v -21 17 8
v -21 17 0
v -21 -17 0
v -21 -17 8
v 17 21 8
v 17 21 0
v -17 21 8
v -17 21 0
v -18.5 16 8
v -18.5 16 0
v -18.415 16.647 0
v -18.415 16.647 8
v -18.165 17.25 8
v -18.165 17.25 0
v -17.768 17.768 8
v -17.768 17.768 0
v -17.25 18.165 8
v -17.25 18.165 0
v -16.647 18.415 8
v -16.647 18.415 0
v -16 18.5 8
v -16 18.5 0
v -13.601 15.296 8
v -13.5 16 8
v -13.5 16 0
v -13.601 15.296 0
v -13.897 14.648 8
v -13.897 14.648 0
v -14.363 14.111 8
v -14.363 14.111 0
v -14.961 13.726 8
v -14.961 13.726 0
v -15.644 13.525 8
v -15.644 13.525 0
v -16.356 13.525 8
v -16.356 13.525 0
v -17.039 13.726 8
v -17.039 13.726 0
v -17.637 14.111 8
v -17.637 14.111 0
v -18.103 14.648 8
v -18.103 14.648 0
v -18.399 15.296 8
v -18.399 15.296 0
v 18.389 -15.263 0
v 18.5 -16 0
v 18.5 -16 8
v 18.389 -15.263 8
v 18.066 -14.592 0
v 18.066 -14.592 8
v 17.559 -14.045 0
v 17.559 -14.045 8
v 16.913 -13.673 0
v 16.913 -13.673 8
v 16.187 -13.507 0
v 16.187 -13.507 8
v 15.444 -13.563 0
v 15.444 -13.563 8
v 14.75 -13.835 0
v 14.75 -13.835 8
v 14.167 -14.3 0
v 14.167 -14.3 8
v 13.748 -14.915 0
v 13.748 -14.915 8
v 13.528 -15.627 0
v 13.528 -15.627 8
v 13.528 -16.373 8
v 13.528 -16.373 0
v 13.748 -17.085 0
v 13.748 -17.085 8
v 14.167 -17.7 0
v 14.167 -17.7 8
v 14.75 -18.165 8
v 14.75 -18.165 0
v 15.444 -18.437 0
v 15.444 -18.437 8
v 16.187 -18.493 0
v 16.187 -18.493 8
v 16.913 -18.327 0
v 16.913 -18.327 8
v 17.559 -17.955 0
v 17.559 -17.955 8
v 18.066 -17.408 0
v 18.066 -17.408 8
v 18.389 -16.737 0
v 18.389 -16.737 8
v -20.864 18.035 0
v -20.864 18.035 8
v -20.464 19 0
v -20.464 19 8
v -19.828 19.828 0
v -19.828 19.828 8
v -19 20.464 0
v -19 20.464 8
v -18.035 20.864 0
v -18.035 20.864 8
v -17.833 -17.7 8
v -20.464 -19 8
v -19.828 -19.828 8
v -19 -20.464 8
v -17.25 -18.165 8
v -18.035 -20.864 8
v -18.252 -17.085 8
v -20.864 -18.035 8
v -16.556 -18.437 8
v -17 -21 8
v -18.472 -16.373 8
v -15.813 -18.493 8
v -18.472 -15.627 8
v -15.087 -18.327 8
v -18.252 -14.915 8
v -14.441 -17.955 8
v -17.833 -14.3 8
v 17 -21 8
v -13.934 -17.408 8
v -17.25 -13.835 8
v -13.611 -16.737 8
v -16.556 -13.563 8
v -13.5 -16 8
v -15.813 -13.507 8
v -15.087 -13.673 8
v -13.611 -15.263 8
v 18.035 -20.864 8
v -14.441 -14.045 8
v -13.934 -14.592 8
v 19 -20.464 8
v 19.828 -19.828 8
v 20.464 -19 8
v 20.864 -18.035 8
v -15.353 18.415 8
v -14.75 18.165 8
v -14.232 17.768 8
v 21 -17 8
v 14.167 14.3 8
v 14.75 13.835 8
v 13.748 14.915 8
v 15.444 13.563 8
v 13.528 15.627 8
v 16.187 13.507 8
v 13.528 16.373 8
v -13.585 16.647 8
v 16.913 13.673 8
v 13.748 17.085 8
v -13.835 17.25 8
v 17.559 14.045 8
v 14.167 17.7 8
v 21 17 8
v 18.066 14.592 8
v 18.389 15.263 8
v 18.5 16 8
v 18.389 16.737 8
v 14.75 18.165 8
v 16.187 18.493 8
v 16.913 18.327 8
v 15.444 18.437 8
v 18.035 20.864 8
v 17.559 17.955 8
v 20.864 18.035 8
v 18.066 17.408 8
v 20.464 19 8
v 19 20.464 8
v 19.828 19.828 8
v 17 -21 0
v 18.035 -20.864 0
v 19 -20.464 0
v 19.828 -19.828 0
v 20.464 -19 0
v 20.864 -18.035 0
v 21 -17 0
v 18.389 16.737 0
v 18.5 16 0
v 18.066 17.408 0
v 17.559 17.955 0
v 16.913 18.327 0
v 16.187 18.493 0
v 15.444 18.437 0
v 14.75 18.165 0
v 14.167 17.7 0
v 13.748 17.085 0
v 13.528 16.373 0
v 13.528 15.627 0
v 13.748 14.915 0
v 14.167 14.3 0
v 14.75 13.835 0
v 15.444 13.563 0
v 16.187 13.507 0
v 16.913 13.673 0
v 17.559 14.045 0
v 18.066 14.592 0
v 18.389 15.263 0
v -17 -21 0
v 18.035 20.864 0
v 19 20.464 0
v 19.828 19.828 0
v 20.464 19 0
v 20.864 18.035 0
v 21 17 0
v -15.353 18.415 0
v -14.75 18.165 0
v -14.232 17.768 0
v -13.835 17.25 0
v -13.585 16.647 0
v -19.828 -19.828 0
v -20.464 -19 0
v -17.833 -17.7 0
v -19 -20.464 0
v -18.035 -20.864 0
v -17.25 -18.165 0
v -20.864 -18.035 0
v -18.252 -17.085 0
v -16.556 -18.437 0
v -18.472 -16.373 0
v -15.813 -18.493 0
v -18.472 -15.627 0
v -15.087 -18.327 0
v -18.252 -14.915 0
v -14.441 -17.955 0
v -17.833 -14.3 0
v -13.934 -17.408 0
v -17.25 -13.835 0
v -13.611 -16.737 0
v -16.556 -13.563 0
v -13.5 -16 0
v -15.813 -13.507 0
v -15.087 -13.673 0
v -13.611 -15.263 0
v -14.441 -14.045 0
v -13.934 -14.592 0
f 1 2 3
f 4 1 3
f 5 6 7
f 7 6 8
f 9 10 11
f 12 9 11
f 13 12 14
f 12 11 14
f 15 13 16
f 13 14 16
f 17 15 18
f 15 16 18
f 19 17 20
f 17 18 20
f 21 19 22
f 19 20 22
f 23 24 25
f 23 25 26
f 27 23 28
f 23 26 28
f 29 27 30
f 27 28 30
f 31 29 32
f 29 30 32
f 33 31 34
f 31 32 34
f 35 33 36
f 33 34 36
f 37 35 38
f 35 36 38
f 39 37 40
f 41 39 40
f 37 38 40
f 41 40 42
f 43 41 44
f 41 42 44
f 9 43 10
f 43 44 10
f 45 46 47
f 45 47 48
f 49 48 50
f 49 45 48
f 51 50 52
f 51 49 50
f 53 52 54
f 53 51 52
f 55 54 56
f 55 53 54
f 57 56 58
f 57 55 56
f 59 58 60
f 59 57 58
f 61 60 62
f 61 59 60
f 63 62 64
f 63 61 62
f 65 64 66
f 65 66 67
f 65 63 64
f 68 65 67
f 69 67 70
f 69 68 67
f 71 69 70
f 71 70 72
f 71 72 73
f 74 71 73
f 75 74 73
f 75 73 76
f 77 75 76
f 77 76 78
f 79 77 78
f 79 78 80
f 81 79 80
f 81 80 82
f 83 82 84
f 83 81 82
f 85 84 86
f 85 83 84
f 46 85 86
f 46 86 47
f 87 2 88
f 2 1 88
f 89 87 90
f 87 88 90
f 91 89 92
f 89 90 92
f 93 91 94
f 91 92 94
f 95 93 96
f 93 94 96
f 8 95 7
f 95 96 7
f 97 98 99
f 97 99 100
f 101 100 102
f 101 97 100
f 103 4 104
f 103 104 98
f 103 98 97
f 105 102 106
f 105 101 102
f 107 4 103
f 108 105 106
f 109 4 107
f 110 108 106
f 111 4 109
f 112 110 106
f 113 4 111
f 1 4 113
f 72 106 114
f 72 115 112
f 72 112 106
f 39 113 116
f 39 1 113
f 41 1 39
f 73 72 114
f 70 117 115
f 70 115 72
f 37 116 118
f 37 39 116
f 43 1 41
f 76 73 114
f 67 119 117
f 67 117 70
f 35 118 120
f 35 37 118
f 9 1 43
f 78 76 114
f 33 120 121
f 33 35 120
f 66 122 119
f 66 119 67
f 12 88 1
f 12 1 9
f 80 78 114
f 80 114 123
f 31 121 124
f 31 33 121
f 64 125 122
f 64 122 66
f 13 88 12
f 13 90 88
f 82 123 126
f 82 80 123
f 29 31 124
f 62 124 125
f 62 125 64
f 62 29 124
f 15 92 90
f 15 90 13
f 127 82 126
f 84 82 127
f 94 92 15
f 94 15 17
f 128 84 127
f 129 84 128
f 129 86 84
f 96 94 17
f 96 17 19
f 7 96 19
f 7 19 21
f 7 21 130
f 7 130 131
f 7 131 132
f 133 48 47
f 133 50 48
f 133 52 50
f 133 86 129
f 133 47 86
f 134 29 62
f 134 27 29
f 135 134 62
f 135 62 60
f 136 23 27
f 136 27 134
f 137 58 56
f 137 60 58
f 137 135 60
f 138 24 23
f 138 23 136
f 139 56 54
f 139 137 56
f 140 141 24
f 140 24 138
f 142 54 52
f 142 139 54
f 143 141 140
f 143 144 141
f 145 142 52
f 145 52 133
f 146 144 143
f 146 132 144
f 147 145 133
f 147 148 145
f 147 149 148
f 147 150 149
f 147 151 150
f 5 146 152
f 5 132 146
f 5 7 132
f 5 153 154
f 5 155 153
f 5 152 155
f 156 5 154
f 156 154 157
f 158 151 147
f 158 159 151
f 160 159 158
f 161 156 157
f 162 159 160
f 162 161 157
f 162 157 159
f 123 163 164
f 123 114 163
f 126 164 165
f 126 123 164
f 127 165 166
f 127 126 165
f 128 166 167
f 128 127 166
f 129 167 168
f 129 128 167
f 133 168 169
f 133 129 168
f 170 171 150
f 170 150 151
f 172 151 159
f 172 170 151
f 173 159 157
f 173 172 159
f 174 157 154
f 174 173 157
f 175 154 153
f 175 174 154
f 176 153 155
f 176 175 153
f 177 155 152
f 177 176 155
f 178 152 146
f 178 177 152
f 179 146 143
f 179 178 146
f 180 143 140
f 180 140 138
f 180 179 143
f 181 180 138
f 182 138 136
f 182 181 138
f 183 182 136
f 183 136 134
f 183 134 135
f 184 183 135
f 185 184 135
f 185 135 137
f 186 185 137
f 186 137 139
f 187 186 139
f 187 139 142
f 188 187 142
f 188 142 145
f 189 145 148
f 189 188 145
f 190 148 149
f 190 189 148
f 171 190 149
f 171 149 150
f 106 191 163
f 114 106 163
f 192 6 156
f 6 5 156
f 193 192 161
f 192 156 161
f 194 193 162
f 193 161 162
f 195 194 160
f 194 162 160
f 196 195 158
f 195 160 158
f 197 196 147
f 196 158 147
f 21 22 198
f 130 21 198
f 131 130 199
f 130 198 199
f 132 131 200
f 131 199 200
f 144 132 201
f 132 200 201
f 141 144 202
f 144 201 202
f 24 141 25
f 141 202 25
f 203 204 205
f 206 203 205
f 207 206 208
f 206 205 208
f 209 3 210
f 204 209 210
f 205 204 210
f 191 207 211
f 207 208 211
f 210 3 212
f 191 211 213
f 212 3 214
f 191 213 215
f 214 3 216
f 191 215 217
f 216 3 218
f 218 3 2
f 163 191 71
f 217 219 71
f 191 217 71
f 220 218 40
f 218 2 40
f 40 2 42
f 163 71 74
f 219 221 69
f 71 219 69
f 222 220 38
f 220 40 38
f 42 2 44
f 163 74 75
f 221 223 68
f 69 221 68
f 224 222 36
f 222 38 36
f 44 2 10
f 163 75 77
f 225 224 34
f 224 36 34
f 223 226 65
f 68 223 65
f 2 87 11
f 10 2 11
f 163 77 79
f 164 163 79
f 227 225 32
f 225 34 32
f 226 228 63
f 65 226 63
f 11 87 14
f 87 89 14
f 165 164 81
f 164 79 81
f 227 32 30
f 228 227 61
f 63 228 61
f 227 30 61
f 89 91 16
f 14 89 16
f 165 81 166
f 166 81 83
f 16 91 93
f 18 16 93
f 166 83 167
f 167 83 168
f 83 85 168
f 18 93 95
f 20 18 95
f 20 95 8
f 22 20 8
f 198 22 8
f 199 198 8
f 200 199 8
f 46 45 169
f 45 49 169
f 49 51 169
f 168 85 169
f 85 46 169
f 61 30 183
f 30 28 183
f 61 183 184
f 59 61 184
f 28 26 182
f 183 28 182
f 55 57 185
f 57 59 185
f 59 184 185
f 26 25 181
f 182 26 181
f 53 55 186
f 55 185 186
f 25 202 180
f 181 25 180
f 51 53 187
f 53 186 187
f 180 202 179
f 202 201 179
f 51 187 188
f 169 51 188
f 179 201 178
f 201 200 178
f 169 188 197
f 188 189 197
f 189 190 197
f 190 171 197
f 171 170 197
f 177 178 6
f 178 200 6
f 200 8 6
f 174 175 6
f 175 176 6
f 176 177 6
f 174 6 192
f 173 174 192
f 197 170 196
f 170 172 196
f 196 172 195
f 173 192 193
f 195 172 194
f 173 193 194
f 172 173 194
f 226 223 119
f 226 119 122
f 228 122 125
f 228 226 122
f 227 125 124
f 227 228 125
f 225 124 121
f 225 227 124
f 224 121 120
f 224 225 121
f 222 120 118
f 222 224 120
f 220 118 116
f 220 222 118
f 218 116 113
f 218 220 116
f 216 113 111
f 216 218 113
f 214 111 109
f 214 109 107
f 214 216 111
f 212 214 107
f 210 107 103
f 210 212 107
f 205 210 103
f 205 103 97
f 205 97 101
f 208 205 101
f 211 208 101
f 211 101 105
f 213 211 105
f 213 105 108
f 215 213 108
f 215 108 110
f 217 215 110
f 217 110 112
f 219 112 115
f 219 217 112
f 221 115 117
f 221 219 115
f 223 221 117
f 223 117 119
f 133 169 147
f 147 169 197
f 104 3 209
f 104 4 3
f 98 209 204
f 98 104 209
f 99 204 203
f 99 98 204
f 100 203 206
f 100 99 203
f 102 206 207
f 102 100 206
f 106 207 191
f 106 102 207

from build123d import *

# Parameters (mm, degrees)
F0_R     = 2.5
F1_DEPTH = 8
F2_R     = 4


with BuildPart() as f1:
    # F0 (on Top) → F1 (new body)
    with BuildSketch(Plane.XY):
        with BuildLine():
            Line((-21, 21), (-21, 16))
            Line((-21, 16), (-18.5, 16))
            ThreePointArc((-18.5, 16), (-17.767767, 17.767767), (-16, 18.5))
            Line((-16, 18.5), (-16, 21))
            Line((-16, 21), (-21, 21))
        make_face()
        with BuildLine():
            Line((-21, -21), (21, -21))
            Line((21, -21), (21, 21))
            Line((21, 21), (-16, 21))
            Line((-16, 21), (-16, 18.5))
            ThreePointArc((-16, 18.5), (-14.232233, 17.767767), (-13.5, 16))
            ThreePointArc((-13.5, 16), (-16, 13.5), (-18.5, 16))
            Line((-18.5, 16), (-21, 16))
            Line((-21, 16), (-21, -21))
        make_face()
        with Locations((-16, -16)):
            Circle(F0_R, mode=Mode.SUBTRACT)
        with Locations((16, -16)):
            Circle(F0_R, mode=Mode.SUBTRACT)
        with Locations((16, 16)):
            Circle(F0_R, mode=Mode.SUBTRACT)
    extrude(amount=F1_DEPTH)

    # F2
    f2_edges = [f1.edges().sort_by_distance(p)[0] for p in [
        (21, -21, 4),
        (-21, -21, 4),
        (21, 21, 4),
        (-21, 21, 4),
    ]]
    fillet(f2_edges, radius=F2_R)


solid = f1.part
